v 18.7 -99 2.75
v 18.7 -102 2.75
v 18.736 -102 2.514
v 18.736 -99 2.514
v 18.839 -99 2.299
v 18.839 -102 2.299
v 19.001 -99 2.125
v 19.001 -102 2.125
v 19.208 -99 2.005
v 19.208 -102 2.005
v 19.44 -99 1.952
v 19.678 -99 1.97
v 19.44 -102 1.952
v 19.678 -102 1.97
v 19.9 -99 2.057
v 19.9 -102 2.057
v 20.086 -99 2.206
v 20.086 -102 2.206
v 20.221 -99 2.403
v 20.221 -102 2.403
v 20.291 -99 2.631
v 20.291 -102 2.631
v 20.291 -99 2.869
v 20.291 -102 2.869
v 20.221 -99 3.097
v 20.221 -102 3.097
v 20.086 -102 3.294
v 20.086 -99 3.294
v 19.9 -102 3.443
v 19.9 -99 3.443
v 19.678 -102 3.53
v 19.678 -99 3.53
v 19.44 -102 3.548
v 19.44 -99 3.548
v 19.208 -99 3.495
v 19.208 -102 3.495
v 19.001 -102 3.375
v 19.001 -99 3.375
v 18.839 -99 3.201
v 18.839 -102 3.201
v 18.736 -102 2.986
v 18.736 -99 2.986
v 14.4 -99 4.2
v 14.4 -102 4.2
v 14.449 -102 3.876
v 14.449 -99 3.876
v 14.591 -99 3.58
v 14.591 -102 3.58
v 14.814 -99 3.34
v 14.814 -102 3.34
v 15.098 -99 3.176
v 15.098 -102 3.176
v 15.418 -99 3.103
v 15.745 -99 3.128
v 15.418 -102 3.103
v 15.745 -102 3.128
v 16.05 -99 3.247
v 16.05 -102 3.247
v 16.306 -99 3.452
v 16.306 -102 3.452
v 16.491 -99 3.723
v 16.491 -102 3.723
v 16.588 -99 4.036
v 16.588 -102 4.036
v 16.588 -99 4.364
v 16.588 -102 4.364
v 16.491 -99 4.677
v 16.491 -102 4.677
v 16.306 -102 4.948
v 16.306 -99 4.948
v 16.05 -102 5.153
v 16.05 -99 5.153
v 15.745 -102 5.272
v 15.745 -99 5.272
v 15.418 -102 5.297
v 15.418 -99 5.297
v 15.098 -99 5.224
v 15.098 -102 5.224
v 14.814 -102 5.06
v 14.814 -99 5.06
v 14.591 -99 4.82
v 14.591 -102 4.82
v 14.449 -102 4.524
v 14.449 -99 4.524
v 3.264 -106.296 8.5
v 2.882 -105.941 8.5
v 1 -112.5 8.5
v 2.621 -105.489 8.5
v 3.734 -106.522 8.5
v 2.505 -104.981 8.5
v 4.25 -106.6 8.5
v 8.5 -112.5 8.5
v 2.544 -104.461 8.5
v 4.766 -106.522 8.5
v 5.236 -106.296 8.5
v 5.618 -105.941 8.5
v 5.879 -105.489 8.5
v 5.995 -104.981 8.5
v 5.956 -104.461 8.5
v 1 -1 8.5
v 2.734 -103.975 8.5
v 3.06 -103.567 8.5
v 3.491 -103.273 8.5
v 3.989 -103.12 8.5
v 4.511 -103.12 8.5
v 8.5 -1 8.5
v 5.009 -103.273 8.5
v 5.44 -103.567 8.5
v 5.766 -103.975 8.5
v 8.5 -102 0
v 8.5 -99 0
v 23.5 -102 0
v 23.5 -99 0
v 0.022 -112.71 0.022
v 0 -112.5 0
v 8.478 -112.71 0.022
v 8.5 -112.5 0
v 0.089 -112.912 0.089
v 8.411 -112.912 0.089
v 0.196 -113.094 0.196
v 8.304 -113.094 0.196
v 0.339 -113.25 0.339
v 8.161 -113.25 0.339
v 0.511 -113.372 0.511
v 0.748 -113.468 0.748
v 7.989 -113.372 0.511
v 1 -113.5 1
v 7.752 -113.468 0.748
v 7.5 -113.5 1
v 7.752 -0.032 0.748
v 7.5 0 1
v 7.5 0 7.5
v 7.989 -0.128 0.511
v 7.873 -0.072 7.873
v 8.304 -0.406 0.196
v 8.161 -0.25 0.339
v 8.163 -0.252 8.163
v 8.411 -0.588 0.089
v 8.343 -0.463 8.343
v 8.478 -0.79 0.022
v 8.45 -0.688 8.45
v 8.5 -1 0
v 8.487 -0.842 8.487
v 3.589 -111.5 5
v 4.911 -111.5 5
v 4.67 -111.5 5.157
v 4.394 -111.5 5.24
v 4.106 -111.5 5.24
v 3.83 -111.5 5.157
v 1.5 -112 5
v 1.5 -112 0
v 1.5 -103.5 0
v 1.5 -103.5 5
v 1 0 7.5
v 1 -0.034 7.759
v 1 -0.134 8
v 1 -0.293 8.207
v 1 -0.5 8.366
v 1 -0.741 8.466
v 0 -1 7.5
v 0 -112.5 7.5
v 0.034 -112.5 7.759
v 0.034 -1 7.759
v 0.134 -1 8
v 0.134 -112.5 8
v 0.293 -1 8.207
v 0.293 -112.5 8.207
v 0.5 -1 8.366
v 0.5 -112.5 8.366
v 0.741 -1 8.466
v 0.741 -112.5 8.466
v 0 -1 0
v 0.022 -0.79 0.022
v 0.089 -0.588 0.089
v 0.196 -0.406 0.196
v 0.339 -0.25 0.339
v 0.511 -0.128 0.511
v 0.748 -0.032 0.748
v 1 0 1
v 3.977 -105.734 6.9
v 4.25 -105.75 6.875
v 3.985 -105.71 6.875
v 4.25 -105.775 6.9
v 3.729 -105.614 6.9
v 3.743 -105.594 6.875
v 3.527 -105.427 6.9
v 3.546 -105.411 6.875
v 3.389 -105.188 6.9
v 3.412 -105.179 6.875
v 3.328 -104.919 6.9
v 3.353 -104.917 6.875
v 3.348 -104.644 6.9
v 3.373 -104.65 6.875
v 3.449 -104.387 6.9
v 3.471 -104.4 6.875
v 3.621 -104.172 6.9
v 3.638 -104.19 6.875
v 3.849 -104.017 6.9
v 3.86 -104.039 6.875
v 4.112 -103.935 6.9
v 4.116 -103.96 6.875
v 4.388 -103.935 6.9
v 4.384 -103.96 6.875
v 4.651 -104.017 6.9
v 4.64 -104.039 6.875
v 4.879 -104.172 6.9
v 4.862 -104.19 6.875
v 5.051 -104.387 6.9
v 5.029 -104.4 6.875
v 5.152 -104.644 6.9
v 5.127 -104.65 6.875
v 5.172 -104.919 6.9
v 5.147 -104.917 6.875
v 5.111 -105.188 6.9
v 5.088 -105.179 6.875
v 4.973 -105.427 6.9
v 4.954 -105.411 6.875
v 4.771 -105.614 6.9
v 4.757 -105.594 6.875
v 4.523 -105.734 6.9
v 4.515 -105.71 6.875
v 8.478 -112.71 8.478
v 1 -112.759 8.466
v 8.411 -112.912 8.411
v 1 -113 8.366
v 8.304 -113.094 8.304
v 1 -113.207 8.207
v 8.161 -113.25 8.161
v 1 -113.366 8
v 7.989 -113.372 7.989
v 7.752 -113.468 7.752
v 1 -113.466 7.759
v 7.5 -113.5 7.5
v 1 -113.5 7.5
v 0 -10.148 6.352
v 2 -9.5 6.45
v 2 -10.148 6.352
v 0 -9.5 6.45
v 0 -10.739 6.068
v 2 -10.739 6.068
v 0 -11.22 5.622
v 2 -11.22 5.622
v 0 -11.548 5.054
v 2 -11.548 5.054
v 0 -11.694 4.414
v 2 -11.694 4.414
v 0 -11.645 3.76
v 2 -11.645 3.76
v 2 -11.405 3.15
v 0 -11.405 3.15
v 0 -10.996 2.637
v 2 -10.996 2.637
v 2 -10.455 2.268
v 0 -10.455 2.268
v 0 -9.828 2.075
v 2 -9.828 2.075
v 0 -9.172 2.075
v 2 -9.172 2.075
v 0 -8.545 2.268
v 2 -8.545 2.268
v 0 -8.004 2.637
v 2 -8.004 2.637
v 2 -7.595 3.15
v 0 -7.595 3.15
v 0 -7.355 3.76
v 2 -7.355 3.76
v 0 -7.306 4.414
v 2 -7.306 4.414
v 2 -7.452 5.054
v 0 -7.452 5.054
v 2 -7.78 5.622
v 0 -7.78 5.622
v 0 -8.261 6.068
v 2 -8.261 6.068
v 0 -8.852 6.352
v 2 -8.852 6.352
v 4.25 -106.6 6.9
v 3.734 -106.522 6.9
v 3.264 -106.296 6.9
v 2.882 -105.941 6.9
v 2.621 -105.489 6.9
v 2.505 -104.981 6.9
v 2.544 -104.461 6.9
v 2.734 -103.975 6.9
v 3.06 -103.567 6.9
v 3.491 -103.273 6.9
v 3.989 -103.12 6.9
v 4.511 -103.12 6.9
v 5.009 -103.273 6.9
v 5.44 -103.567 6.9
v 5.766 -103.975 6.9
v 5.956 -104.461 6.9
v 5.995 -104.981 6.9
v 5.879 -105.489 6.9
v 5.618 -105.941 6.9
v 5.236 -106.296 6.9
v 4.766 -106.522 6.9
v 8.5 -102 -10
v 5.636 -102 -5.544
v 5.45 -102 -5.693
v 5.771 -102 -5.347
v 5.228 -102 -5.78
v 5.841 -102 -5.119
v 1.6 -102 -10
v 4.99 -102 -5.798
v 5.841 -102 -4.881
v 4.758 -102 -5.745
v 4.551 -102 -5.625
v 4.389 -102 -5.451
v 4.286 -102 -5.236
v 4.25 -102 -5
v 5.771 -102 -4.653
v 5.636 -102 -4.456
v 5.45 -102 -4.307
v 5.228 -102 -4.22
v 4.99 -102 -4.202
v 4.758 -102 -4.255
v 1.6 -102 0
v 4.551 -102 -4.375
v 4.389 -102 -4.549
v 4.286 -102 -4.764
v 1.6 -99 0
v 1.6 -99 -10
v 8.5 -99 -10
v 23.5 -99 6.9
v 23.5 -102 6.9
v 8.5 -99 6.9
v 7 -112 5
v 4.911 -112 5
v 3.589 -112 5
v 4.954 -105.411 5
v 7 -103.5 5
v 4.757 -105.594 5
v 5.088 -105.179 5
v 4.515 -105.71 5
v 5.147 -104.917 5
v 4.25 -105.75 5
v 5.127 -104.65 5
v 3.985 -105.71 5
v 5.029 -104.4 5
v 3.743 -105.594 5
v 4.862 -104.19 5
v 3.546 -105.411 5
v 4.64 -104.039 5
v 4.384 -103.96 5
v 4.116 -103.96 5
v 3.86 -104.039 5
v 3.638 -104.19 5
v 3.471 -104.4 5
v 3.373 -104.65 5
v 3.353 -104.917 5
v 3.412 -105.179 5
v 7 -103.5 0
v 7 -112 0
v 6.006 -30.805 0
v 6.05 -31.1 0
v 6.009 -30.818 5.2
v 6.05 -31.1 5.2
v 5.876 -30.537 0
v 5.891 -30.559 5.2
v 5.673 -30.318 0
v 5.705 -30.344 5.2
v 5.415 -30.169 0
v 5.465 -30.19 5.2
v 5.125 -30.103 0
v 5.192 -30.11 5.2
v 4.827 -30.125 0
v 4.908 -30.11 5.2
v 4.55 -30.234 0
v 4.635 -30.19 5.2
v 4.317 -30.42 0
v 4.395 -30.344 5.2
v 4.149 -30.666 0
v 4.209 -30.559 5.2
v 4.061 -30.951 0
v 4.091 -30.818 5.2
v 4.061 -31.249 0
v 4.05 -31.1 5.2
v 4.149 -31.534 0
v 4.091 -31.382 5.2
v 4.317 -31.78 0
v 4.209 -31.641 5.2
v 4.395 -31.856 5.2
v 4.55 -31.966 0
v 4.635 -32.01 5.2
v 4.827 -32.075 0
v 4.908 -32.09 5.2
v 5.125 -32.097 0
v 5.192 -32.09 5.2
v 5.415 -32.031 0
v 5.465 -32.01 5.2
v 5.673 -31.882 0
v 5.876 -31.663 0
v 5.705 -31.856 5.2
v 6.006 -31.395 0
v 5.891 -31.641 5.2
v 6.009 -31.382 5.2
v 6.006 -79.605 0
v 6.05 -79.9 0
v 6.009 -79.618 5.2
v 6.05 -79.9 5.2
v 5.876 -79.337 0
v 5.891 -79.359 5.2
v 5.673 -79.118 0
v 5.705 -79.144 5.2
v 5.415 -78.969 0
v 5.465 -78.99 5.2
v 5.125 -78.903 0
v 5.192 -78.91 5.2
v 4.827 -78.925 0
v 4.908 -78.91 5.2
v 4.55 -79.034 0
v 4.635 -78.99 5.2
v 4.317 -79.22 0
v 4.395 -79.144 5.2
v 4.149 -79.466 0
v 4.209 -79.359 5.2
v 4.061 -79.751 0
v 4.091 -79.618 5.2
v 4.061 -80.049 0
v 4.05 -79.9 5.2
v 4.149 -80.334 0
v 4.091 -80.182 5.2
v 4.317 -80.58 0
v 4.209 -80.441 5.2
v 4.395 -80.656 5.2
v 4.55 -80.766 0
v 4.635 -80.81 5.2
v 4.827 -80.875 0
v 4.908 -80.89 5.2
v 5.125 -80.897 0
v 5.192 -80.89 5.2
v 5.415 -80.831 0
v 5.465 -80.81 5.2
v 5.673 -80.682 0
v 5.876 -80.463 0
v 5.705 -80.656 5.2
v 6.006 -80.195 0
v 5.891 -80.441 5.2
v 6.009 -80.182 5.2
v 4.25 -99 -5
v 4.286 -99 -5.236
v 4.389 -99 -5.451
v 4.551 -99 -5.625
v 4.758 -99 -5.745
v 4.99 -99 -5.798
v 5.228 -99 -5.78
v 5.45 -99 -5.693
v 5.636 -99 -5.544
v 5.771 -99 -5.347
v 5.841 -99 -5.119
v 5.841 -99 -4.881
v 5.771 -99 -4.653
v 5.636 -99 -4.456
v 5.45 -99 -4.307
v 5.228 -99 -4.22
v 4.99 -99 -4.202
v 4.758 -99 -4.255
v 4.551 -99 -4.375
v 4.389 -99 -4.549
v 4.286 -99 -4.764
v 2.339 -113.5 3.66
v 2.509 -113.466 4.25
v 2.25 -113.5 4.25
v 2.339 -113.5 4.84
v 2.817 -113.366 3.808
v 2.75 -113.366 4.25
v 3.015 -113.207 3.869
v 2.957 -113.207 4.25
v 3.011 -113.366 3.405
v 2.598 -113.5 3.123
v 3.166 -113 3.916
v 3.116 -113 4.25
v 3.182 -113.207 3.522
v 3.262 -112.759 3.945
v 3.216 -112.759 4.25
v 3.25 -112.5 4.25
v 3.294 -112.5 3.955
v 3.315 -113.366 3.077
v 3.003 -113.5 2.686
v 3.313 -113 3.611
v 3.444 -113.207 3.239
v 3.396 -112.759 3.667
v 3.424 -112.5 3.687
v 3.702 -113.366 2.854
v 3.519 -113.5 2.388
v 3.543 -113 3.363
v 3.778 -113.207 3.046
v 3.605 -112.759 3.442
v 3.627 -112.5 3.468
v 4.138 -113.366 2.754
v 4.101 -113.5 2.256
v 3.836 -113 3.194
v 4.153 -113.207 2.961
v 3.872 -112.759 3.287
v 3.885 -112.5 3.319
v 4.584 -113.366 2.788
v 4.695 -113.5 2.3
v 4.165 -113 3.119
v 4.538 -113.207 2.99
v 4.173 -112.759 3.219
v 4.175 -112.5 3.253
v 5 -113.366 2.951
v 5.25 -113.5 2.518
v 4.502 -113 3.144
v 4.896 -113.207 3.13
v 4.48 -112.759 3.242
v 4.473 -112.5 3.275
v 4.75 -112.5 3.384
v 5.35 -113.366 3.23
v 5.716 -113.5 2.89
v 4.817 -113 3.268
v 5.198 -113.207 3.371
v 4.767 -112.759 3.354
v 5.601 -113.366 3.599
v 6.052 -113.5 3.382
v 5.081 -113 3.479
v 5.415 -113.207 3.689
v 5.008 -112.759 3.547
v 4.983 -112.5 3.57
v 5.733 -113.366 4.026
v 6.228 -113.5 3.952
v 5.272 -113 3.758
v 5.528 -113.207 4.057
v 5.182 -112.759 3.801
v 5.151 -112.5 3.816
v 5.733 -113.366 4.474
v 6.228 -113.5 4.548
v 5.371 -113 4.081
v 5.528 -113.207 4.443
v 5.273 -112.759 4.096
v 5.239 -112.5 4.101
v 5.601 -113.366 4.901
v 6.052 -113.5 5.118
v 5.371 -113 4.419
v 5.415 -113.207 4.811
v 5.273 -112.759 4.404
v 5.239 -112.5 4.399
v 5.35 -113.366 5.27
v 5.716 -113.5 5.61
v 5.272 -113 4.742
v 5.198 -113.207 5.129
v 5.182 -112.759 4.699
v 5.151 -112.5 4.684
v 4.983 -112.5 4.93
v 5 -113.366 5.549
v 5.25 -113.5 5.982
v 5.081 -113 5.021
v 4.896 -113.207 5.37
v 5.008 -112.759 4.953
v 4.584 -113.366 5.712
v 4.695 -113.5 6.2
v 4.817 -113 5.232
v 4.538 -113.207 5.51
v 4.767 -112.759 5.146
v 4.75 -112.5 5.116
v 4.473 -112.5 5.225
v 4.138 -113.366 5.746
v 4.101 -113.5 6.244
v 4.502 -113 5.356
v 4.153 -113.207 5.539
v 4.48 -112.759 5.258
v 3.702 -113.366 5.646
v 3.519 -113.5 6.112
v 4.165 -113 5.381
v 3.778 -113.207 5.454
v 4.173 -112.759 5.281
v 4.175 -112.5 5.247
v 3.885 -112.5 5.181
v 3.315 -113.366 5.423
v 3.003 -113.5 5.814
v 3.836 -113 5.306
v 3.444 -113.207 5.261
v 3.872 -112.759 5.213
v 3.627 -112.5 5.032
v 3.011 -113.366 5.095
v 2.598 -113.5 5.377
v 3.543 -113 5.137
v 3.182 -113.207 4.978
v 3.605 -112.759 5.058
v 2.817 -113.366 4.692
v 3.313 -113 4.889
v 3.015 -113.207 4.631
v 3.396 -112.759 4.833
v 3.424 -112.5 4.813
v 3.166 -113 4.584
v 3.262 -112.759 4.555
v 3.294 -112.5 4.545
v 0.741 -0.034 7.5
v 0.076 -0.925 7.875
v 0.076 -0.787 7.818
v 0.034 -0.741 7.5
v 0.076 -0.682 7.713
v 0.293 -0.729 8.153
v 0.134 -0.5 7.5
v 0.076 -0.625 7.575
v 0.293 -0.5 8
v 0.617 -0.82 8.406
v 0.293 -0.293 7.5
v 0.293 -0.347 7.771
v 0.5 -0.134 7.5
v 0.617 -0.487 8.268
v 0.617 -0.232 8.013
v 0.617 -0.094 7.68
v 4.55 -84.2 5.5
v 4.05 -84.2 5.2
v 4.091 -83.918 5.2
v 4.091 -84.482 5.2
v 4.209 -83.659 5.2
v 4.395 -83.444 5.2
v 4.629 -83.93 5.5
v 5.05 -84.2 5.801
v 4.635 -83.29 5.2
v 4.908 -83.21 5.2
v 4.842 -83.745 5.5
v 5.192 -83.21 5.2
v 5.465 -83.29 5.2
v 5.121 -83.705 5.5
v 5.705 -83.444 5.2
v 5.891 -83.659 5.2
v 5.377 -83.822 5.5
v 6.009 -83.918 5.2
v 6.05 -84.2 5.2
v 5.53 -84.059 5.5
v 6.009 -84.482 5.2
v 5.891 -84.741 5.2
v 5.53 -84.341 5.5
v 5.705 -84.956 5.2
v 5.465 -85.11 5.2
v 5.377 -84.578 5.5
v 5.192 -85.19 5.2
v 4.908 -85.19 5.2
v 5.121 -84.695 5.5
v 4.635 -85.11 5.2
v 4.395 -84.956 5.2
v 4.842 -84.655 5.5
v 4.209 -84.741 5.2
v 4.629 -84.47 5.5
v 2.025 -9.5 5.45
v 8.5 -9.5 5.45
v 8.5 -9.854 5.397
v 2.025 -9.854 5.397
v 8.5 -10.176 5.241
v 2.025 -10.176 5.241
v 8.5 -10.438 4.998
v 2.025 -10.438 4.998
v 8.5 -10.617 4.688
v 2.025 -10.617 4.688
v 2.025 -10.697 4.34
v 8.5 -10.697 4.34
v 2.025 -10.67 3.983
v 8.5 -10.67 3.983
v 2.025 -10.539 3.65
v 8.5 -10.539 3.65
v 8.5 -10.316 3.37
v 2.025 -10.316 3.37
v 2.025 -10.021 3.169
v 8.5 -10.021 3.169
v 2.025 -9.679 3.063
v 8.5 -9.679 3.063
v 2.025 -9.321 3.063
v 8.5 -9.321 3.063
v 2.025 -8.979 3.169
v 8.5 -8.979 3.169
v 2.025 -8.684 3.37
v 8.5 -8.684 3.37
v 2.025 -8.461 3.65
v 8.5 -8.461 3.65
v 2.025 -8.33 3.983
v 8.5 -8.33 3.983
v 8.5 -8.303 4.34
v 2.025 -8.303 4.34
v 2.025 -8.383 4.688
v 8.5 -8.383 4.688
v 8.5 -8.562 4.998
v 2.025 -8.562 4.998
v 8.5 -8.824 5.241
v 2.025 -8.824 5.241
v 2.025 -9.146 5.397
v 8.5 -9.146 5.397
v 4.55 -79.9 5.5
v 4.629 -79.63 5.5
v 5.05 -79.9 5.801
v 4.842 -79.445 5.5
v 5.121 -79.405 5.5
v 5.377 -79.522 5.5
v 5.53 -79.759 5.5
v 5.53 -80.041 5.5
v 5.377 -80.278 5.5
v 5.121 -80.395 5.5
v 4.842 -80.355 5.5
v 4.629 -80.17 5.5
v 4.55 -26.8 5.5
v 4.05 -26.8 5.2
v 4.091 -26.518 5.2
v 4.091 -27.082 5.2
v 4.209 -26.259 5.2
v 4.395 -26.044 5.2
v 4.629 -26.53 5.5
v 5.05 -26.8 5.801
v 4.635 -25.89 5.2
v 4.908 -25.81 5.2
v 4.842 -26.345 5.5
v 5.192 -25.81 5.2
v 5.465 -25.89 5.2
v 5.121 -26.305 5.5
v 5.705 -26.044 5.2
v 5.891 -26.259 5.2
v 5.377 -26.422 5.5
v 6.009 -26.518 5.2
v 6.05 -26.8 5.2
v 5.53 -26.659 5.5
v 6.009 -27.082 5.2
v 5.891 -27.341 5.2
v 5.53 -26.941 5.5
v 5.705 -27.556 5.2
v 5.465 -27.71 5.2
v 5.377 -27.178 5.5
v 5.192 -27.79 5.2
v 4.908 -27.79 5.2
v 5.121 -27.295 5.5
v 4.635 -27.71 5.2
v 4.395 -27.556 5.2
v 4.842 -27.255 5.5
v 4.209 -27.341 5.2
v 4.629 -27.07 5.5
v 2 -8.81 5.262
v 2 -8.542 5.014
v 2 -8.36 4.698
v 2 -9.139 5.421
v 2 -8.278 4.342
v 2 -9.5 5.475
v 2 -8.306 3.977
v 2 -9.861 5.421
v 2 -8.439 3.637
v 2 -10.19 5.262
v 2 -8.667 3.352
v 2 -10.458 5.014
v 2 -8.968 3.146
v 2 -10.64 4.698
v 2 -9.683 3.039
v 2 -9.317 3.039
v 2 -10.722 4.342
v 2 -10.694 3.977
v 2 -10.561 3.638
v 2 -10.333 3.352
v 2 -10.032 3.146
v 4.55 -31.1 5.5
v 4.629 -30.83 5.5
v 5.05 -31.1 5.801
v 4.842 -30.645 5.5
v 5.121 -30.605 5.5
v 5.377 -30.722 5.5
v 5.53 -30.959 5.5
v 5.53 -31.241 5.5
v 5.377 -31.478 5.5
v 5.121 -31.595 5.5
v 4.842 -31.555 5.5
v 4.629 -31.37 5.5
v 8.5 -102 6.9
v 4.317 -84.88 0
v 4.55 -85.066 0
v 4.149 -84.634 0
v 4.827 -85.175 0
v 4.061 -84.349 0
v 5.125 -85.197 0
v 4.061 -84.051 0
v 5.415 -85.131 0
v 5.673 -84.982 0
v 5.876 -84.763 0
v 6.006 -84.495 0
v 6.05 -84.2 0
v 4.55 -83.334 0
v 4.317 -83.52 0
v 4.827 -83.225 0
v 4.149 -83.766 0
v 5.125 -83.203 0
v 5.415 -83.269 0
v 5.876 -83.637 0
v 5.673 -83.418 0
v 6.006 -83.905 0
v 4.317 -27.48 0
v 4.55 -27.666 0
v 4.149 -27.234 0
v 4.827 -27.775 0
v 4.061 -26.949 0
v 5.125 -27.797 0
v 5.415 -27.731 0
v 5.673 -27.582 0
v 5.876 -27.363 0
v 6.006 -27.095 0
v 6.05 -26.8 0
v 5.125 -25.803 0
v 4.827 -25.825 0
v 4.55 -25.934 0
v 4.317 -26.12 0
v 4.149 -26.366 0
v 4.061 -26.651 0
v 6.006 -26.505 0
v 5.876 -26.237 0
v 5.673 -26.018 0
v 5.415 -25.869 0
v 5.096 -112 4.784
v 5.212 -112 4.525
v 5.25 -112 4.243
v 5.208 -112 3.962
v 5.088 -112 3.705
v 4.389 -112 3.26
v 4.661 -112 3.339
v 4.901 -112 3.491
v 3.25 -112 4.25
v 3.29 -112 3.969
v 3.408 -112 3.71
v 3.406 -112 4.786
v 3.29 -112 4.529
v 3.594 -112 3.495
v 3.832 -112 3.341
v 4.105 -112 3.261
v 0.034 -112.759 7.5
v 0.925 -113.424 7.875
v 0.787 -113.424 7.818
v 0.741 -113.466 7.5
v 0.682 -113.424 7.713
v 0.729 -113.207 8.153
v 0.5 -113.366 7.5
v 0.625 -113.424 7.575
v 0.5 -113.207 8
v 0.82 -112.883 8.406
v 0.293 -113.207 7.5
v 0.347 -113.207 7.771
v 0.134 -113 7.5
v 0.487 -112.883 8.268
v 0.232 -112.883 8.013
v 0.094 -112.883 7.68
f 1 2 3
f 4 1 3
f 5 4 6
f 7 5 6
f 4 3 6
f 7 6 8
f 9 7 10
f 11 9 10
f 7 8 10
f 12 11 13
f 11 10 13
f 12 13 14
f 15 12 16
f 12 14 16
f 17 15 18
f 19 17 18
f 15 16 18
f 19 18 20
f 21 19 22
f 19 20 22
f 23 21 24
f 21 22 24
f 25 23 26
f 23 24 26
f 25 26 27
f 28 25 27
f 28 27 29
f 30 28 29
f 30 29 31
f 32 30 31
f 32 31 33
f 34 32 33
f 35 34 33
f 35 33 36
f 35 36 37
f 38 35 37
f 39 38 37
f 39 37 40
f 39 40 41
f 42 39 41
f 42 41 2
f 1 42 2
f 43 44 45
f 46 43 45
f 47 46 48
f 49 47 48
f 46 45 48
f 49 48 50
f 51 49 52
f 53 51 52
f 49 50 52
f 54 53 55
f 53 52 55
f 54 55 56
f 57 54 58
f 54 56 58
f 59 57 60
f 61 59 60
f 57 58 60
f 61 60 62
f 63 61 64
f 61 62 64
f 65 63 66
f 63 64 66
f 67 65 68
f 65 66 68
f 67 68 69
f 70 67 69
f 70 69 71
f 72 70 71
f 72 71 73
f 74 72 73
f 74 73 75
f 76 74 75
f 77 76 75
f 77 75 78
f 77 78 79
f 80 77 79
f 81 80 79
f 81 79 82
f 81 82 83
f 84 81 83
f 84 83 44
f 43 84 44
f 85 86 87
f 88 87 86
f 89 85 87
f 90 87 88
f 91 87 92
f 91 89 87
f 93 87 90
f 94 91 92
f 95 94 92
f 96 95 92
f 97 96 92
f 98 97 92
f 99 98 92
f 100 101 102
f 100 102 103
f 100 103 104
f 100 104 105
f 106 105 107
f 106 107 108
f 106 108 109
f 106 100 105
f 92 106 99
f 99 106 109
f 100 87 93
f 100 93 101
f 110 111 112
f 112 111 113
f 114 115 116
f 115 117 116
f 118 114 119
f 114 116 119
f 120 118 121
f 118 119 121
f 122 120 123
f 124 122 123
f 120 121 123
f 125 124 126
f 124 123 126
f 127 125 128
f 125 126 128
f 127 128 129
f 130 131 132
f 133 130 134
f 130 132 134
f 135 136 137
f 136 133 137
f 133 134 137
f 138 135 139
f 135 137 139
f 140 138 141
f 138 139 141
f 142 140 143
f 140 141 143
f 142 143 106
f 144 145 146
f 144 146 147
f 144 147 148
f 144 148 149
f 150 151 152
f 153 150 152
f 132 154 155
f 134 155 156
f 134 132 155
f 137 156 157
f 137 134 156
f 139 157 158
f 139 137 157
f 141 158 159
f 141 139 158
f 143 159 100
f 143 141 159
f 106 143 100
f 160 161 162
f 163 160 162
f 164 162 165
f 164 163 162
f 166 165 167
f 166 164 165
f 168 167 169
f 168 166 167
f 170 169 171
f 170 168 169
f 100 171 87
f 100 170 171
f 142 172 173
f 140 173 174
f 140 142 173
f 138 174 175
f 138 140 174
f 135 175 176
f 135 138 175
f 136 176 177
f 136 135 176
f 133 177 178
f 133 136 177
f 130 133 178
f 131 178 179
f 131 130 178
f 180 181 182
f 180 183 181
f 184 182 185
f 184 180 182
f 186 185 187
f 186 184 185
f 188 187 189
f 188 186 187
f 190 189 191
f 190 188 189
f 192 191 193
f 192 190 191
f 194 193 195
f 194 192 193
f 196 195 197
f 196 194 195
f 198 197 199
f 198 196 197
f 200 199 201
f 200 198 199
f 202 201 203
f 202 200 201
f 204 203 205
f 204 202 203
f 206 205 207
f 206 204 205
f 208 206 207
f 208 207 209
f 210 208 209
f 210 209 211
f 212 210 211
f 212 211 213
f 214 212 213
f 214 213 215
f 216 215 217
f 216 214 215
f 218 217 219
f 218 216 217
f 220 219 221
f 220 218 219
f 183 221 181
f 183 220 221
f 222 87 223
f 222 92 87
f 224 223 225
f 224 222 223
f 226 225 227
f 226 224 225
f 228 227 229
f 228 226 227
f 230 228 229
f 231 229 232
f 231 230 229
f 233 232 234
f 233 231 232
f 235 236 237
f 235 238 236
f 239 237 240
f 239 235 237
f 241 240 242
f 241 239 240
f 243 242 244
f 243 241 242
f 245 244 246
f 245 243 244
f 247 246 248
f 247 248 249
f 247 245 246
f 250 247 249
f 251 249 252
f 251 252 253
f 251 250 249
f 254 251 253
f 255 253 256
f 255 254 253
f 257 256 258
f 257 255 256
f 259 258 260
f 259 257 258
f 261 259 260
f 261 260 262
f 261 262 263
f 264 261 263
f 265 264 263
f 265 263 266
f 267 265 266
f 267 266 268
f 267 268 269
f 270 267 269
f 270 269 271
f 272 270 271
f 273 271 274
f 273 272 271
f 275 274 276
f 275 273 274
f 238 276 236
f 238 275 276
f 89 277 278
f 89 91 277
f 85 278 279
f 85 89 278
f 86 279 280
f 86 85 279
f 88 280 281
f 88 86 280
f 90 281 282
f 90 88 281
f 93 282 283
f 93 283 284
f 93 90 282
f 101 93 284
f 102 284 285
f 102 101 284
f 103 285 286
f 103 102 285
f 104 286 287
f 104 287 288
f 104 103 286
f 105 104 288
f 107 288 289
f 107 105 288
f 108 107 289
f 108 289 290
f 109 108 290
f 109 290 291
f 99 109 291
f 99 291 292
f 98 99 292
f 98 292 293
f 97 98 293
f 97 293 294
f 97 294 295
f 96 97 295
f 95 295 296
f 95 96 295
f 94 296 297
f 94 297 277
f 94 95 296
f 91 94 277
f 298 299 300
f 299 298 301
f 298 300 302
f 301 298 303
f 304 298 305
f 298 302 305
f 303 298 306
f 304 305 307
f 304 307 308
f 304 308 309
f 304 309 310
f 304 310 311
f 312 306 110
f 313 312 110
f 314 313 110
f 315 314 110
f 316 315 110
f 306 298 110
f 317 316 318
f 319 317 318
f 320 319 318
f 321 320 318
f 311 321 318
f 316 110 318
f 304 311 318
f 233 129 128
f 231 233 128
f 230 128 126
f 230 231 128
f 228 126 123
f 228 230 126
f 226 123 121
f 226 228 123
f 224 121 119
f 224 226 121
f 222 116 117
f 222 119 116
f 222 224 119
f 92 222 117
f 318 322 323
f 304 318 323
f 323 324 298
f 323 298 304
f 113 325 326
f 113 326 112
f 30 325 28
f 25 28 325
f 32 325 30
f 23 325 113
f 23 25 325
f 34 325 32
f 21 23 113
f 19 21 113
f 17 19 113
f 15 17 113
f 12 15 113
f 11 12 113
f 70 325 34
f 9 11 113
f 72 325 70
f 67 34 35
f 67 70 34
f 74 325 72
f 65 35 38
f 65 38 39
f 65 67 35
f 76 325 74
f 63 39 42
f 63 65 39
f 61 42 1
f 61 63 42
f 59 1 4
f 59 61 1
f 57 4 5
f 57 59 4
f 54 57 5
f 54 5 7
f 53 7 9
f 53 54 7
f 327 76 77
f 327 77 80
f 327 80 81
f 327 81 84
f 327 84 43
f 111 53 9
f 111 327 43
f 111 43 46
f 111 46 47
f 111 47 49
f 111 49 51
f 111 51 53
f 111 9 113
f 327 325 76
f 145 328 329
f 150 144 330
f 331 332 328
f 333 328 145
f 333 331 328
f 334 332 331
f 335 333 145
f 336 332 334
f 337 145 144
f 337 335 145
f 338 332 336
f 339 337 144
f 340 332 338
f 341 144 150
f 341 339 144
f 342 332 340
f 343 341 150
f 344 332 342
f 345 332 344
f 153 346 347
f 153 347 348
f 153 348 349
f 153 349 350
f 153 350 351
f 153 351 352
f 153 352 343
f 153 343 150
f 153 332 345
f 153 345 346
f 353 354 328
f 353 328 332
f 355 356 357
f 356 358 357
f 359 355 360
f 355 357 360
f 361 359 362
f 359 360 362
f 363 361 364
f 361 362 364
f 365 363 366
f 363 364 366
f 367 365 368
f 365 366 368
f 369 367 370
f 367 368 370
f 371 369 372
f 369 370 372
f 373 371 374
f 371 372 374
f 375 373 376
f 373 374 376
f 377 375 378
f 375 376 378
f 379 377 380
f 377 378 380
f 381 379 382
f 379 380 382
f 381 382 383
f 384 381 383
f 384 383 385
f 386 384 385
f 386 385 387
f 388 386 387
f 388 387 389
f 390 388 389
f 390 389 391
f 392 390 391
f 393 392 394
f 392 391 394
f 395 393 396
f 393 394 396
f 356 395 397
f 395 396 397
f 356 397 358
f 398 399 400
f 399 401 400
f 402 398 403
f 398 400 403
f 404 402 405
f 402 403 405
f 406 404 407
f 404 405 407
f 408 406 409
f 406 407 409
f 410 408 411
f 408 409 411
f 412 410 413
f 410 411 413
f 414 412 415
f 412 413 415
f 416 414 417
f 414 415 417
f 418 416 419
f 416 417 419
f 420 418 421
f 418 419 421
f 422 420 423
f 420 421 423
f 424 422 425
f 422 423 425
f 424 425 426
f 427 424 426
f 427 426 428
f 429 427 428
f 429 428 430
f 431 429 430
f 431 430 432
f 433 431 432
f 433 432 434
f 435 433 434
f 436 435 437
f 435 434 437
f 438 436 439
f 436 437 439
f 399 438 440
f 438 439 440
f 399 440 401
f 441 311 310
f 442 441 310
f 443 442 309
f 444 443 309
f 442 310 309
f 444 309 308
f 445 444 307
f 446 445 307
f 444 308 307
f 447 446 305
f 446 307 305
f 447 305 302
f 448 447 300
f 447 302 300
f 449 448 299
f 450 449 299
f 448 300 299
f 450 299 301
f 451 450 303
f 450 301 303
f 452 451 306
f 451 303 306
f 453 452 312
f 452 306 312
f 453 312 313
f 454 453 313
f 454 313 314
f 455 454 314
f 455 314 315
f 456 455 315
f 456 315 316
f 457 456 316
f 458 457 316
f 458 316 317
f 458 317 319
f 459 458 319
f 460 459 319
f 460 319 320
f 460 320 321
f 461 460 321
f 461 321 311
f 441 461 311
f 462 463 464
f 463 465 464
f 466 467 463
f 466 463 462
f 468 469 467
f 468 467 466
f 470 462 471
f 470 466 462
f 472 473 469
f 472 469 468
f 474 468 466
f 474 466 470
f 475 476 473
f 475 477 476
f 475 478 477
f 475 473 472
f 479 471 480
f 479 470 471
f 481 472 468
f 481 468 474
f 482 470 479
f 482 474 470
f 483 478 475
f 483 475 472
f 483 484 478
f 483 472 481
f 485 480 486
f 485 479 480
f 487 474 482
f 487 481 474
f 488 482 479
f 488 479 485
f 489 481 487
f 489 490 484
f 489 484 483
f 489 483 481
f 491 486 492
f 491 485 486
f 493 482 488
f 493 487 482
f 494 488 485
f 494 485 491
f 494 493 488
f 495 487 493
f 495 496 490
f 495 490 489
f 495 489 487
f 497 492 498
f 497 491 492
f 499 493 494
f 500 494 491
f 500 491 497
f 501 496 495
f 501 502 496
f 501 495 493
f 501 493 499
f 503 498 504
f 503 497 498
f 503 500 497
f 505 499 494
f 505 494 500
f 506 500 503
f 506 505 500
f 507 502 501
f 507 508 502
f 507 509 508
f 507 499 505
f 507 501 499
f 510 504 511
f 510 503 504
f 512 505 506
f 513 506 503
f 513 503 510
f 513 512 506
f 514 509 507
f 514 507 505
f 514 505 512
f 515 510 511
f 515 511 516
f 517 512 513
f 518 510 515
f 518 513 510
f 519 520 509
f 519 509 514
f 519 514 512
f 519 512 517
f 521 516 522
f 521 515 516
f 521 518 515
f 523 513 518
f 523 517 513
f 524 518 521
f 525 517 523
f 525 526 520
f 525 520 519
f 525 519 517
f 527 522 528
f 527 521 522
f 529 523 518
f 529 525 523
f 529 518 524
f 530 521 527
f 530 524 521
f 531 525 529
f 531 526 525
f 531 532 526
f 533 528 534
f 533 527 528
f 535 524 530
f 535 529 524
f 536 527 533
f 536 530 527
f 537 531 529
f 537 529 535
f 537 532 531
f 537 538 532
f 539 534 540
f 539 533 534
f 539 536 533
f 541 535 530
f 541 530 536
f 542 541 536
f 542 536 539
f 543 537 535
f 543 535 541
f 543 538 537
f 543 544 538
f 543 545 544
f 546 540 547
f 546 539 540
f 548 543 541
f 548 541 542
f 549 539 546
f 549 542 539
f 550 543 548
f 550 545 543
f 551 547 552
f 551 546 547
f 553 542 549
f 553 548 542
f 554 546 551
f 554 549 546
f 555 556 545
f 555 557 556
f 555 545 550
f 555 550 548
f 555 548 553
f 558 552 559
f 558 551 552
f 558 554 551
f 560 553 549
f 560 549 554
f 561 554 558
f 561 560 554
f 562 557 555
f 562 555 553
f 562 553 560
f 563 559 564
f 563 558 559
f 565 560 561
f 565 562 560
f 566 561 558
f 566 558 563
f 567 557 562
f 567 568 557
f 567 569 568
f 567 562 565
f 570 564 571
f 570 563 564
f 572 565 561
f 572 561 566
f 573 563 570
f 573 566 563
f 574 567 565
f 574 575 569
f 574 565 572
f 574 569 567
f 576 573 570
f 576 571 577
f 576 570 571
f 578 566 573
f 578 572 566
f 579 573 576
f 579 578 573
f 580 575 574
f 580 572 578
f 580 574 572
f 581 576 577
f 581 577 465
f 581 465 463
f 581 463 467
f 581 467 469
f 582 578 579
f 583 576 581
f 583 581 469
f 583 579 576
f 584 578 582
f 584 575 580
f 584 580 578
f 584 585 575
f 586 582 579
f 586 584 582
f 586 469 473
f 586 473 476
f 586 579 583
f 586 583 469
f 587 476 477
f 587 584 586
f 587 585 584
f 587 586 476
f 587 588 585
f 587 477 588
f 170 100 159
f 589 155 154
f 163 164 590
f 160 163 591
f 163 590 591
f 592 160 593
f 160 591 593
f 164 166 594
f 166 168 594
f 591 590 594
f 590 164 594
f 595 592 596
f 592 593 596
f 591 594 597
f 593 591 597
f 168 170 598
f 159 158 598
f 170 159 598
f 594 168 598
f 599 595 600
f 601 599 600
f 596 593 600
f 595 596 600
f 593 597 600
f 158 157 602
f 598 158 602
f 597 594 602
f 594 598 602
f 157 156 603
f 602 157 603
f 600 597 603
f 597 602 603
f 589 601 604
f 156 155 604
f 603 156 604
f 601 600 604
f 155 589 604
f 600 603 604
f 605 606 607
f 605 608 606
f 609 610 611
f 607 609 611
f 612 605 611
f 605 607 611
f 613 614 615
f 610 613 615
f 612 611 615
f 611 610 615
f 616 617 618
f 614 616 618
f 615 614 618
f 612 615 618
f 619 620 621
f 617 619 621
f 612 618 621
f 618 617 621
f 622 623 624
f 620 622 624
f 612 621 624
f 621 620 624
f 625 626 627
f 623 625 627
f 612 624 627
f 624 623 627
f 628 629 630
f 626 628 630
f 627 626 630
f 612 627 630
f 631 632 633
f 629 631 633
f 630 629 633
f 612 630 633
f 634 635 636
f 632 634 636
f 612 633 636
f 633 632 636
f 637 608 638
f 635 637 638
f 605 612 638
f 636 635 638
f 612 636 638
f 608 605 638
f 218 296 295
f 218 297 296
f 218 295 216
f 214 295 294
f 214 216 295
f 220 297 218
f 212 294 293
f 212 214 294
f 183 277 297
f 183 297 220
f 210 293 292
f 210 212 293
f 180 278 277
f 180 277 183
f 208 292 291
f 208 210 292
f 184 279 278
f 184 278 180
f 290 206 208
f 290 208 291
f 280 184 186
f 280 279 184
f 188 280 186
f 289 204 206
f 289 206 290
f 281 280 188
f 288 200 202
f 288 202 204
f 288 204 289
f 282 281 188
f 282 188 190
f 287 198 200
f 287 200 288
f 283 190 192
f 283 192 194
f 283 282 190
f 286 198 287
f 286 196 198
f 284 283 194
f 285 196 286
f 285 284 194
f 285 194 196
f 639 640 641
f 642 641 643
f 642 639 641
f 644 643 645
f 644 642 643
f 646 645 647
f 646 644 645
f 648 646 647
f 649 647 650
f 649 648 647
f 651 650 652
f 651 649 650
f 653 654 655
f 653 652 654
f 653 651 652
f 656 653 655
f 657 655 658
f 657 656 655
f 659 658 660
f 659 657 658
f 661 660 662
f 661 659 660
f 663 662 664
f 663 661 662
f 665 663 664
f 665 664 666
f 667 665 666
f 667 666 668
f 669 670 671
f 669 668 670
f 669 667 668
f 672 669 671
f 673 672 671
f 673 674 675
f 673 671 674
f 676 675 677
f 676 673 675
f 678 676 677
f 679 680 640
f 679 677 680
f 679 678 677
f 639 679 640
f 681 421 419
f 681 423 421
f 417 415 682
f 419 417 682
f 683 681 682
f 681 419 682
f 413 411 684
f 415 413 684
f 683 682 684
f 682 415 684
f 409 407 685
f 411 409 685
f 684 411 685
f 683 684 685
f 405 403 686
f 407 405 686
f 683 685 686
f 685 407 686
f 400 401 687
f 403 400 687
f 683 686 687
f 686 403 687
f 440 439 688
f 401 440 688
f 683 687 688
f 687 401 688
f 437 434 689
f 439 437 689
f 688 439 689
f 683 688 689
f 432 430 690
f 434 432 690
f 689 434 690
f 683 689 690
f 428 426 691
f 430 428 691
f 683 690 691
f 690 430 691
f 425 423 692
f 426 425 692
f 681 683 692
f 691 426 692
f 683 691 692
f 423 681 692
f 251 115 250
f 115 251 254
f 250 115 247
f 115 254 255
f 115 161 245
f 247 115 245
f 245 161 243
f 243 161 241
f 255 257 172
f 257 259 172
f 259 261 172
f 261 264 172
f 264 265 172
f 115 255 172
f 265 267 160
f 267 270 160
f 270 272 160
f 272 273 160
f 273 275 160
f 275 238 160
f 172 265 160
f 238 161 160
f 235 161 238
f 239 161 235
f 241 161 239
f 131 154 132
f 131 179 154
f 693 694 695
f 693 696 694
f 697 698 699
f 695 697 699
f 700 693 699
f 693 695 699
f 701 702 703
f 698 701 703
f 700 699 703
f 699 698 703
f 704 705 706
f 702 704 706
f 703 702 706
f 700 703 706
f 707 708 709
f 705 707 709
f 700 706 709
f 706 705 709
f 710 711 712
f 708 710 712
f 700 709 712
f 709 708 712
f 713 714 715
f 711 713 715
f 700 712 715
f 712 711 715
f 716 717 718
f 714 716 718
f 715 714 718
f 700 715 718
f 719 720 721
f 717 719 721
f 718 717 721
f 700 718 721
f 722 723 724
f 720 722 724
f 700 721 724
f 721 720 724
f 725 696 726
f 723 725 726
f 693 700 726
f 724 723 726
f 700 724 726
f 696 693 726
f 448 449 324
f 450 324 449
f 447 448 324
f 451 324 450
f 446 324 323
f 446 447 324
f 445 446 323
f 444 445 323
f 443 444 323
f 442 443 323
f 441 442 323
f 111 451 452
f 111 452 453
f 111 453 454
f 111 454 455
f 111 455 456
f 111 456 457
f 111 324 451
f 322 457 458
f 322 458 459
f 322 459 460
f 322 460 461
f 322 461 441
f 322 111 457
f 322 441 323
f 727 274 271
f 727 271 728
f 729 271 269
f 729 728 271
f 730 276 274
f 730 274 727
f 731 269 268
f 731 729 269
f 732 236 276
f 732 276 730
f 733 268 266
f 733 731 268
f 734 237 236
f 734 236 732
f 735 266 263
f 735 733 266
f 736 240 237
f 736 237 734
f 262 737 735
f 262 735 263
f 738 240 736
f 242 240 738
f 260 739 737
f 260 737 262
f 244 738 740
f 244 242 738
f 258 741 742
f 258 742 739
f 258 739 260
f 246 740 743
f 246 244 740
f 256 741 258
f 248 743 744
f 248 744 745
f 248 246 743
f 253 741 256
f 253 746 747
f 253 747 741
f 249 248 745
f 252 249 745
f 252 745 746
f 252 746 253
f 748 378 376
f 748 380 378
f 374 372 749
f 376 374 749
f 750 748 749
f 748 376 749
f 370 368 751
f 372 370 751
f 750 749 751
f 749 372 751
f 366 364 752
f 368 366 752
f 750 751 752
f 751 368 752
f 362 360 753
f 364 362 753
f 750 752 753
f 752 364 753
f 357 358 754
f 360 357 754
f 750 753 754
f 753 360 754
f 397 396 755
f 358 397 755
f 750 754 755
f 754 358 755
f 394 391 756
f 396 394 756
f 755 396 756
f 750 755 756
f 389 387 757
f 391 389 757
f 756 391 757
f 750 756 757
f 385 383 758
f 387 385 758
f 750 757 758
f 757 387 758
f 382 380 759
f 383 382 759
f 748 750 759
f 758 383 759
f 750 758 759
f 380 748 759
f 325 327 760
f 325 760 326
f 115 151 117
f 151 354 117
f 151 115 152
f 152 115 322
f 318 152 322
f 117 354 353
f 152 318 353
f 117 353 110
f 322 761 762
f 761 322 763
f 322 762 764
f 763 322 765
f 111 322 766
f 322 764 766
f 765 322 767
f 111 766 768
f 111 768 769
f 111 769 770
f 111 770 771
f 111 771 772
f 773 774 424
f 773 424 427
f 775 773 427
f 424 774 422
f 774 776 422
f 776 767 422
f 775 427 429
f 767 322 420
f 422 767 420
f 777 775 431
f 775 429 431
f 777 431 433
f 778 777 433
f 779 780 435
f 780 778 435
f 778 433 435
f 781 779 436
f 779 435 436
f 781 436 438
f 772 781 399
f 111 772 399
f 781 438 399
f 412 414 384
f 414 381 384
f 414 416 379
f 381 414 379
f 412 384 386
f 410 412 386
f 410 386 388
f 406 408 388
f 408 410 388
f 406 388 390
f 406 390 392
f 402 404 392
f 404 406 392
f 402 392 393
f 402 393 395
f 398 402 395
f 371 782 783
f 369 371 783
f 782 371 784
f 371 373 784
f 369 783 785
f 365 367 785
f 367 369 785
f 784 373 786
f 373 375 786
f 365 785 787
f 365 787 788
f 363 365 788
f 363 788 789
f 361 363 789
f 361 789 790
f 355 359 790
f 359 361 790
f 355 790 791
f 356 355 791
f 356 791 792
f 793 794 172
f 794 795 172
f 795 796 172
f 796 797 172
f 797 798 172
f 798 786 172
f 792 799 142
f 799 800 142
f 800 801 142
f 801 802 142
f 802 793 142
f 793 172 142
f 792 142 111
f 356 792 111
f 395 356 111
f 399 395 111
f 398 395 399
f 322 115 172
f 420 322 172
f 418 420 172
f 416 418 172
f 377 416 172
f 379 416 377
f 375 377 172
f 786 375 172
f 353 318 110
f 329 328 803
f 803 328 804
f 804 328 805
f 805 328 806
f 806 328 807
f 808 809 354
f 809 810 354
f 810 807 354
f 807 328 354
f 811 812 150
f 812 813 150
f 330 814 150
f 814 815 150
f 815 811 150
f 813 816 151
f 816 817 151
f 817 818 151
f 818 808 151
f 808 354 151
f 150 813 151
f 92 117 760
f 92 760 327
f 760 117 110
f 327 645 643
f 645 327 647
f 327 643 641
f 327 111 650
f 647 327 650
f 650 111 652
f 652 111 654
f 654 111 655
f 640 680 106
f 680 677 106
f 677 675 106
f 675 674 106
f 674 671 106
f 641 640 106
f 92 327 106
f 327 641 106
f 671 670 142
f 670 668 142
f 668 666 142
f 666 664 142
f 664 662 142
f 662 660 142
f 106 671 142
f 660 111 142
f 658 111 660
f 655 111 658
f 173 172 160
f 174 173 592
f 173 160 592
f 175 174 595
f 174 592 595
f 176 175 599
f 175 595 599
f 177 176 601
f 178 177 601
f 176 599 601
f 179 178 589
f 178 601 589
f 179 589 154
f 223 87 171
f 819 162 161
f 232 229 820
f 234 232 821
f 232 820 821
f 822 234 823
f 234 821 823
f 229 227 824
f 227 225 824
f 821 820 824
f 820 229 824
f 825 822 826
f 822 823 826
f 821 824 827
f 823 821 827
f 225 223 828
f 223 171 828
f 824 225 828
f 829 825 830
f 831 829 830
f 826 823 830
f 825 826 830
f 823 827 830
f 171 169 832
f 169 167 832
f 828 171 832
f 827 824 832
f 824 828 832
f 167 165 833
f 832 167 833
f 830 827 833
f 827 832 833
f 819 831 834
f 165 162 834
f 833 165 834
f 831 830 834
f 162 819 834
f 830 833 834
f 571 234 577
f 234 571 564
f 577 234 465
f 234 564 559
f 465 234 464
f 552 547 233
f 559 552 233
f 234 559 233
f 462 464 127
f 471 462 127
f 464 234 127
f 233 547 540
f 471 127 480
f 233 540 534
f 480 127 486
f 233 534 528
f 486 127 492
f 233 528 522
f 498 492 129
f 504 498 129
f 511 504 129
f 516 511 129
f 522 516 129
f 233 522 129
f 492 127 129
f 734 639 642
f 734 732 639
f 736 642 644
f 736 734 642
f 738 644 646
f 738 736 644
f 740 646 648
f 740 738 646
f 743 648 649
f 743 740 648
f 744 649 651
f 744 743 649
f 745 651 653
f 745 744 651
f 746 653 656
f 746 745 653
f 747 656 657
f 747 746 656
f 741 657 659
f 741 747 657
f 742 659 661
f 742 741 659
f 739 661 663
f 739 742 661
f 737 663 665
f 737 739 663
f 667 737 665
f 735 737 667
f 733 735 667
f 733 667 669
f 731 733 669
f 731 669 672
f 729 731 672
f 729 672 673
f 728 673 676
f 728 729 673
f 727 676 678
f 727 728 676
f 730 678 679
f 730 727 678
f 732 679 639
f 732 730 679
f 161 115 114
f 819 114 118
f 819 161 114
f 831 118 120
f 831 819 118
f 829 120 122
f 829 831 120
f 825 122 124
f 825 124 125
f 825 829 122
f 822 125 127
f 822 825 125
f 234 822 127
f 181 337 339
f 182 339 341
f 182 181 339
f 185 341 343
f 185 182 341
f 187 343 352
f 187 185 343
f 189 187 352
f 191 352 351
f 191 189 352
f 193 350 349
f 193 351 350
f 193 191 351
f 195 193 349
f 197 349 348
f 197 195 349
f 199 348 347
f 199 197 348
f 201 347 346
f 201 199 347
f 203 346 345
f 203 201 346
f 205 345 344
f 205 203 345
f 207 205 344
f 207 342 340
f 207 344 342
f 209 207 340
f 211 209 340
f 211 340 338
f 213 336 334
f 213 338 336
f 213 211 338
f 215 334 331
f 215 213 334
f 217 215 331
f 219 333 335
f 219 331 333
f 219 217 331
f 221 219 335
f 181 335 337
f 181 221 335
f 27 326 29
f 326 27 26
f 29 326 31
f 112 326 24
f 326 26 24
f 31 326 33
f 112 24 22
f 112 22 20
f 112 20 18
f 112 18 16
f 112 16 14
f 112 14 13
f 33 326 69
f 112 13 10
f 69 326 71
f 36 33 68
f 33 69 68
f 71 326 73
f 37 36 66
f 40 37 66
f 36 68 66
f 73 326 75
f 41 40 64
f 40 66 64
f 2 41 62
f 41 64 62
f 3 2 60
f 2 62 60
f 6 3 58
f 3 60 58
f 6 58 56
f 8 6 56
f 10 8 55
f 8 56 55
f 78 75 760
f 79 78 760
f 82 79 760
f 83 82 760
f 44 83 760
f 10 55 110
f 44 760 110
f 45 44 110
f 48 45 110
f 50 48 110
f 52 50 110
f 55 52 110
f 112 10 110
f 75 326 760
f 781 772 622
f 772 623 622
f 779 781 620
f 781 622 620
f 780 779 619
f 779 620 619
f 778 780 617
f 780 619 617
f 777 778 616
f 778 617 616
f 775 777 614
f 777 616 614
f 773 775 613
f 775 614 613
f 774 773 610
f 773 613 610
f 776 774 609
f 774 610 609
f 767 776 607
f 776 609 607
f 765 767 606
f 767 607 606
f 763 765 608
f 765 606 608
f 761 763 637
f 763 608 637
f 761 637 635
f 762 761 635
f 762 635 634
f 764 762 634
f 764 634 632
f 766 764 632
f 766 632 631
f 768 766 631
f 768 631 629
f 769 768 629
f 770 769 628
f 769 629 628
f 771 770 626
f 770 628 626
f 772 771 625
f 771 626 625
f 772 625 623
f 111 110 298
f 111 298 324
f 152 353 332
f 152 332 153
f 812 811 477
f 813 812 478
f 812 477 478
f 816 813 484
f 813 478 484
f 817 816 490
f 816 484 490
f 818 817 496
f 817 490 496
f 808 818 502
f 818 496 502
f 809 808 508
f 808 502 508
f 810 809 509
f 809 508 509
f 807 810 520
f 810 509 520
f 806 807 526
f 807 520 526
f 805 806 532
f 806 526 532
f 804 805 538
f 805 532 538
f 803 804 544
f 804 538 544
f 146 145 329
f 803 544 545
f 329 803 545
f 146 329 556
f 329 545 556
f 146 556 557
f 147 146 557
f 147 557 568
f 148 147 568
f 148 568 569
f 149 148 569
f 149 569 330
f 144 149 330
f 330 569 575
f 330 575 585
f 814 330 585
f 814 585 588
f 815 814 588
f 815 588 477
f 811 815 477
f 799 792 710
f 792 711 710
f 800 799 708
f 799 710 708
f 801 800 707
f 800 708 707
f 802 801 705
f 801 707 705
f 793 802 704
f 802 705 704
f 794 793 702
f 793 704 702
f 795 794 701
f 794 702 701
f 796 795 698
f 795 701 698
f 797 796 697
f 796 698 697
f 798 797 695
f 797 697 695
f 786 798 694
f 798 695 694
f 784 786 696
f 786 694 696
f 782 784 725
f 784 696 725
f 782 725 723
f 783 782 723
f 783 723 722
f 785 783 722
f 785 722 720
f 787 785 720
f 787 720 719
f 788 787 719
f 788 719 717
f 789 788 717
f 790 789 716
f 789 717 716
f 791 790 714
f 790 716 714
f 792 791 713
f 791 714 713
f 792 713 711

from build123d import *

# Parameters (mm, degrees)
SKETCH1_W                      = 8.5
SKETCH1_H                      = 113.5
BOSS_EXTRUDE1_DEPTH            = 8.5
SKETCH12_W                     = 8.5
SKETCH12_H                     = 3
BOSS_EXTRUDE2_DEPTH            = 15
M2X0_4_TAPPED_HOLE1_D          = 1.6
M2X0_4_TAPPED_HOLE1_DEPTH      = 5.2
M2X0_4_TAPPED_HOLE1_TIP        = 0.480688495
F_2_2_2_2_DIAMETER_HOLE1_D     = 2.2
F_2_2_2_2_DIAMETER_HOLE1_DEPTH = 13
SKETCH25_W                     = 8.5
SKETCH25_H                     = 3
BOSS_EXTRUDE3_DEPTH            = 10
SKETCH30_W                     = 5.5
SKETCH30_H                     = 8.5
CUT_EXTRUDE2_DEPTH             = 5
SKETCH31_R                     = 1
CUT_EXTRUDE3_DEPTH             = 2
FILLET1_R                      = 1
M2X0_4_TAPPED_HOLE3_D          = 1.6
M2X0_4_TAPPED_HOLE3_DEPTH      = 3
M2X0_4_TAPPED_HOLE2_D          = 2
M2X0_4_TAPPED_HOLE2_DEPTH      = 5.2
M2X0_4_TAPPED_HOLE2_TIP        = 0.600860619
SKETCH45_W                     = 1.6
SKETCH45_H                     = 10
SKETCH45_W_2                   = 15
SKETCH45_H_2                   = 1.6
CUT_EXTRUDE4_DEPTH             = 10


with BuildPart() as part:
    # Sketch1 → Boss-Extrude1 (new body)
    with BuildSketch(Plane.XY):
        with Locations((4.25, -56.75)):
            Rectangle(SKETCH1_W, SKETCH1_H)
    extrude(amount=BOSS_EXTRUDE1_DEPTH)

    # Sketch12 → Boss-Extrude2 (add)
    with BuildSketch(Plane(origin=(8.5, 0, 0), x_dir=(0, 0, -1), z_dir=(1, 0, 0))):
        with Locations((-4.25, -100.5)):
            Rectangle(SKETCH12_W, SKETCH12_H)
    extrude(amount=BOSS_EXTRUDE2_DEPTH)

    # M2x0.4 Tapped Hole1
    with Locations(Plane(origin=(0, -99, 0), x_dir=(1, 0, 0), z_dir=(0, 1, 0))):
        with Locations((19.5, -2.75)):
            Hole(M2X0_4_TAPPED_HOLE1_D / 2, depth=M2X0_4_TAPPED_HOLE1_DEPTH)
            with Locations((0, 0, -(M2X0_4_TAPPED_HOLE1_DEPTH + M2X0_4_TAPPED_HOLE1_TIP / 2))):  # 118° drill point
                Cone(0, M2X0_4_TAPPED_HOLE1_D / 2, M2X0_4_TAPPED_HOLE1_TIP, mode=Mode.SUBTRACT)

    # Ø2.2 (2.2) Diameter Hole1
    with Locations(Plane(origin=(0, -99, 0), x_dir=(1, 0, 0), z_dir=(0, 1, 0))):
        with Locations((15.5, -4.2)):
            Hole(F_2_2_2_2_DIAMETER_HOLE1_D / 2, depth=F_2_2_2_2_DIAMETER_HOLE1_DEPTH)

    # Sketch19 → CBORE for M2 Socket Head Cap Screw1 (revolve, cut)
    with BuildSketch(Plane(origin=(0, -9.5, 4.25), x_dir=(0, 0, 1), z_dir=(0, 1, 0))):
        Polygon((0, 0), (0, 23.500025), (1.2, 23.500025), (1.2, 2.025), (1.225, 2), (2.2, 2), (2.2, 0), align=None)
    revolve(axis=Axis((-6.35, -9.5, 4.25), (1, 0, 0)), mode=Mode.SUBTRACT)

    # Sketch25 → Boss-Extrude3 (add)
    with BuildSketch(Plane(origin=(0, 0, 0), x_dir=(-1, 0, 0), z_dir=(0, 0, -1))):
        with Locations((-4.25, -100.5)):
            Rectangle(SKETCH25_W, SKETCH25_H)
    extrude(amount=BOSS_EXTRUDE3_DEPTH)

    # Sketch30 → Cut-Extrude2 (cut)
    with BuildSketch(Plane(origin=(0, 0, 0), x_dir=(-1, 0, 0), z_dir=(0, 0, -1))):
        with Locations((-4.25, -107.75)):
            Rectangle(SKETCH30_W, SKETCH30_H)
    extrude(amount=-CUT_EXTRUDE2_DEPTH, mode=Mode.SUBTRACT)

    # Sketch31 → Cut-Extrude3 (cut)
    with BuildSketch(Plane(origin=(0, -113.5, 0), x_dir=(-1, 0, 0), z_dir=(0, -1, 0))):
        with Locations((-4.25, -4.25)):
            Circle(SKETCH31_R)
    extrude(amount=-CUT_EXTRUDE3_DEPTH, mode=Mode.SUBTRACT)

    # Fillet1
    fillet1_edges = [part.edges().sort_by_distance(p)[0] for p in [
        (4.25, 0, 8.5),
        (0, -56.75, 8.5),
        (4.25, 0, 0),
        (4.25, -113.5, 0),
        (4.25, -113.5, 8.5),
        (0, 0, 4.25),
        (8.5, 0, 4.25),
        (8.5, -113.5, 4.25),
        (0, -113.5, 4.25),
        (5.25, -113.5, 4.25),
    ]]
    fillet(fillet1_edges, radius=FILLET1_R)

    # M2x0.4 Tapped Hole3
    with Locations(Plane(origin=(0, -99, 0), x_dir=(1, 0, 0), z_dir=(0, 1, 0))):
        with Locations((5.05, 5)):
            Hole(M2X0_4_TAPPED_HOLE3_D / 2, depth=M2X0_4_TAPPED_HOLE3_DEPTH)

    # M2x0.4 Tapped Hole2
    with Locations(Plane(origin=(0, 0, 0), x_dir=(-1, 0, 0), z_dir=(0, 0, -1))):
        with Locations((-5.05, -26.8), (-5.05, -84.2), (-5.05, -31.1), (-5.05, -79.9)):
            Hole(M2X0_4_TAPPED_HOLE2_D / 2, depth=M2X0_4_TAPPED_HOLE2_DEPTH)
            with Locations((0, 0, -(M2X0_4_TAPPED_HOLE2_DEPTH + M2X0_4_TAPPED_HOLE2_TIP / 2))):  # 118° drill point
                Cone(0, M2X0_4_TAPPED_HOLE2_D / 2, M2X0_4_TAPPED_HOLE2_TIP, mode=Mode.SUBTRACT)

    # Sketch43 → CBORE for M1.6 Socket Head Cap Screw1 (revolve, cut)
    with BuildSketch(Plane(origin=(4.25, -104.85, 8.5), x_dir=(0, -1, 0), z_dir=(1, 0, 0))):
        Polygon((0, 0), (0, 18.500025), (0.9, 18.500025), (0.9, 1.625), (0.925, 1.6), (1.75, 1.6), (1.75, 0), align=None)
    revolve(axis=Axis((4.25, -104.85, 14.85), (0, 0, -1)), mode=Mode.SUBTRACT)

    # Sketch45 → Cut-Extrude4 (cut)
    with BuildSketch(Plane(origin=(0, -99, 0), x_dir=(1, 0, 0), z_dir=(0, 1, 0))):
        with Locations((0.8, 5)):
            Rectangle(SKETCH45_W, SKETCH45_H)
        with Locations((16, -7.7)):
            Rectangle(SKETCH45_W_2, SKETCH45_H_2)
    extrude(amount=-CUT_EXTRUDE4_DEPTH, mode=Mode.SUBTRACT)


solid = part.part
